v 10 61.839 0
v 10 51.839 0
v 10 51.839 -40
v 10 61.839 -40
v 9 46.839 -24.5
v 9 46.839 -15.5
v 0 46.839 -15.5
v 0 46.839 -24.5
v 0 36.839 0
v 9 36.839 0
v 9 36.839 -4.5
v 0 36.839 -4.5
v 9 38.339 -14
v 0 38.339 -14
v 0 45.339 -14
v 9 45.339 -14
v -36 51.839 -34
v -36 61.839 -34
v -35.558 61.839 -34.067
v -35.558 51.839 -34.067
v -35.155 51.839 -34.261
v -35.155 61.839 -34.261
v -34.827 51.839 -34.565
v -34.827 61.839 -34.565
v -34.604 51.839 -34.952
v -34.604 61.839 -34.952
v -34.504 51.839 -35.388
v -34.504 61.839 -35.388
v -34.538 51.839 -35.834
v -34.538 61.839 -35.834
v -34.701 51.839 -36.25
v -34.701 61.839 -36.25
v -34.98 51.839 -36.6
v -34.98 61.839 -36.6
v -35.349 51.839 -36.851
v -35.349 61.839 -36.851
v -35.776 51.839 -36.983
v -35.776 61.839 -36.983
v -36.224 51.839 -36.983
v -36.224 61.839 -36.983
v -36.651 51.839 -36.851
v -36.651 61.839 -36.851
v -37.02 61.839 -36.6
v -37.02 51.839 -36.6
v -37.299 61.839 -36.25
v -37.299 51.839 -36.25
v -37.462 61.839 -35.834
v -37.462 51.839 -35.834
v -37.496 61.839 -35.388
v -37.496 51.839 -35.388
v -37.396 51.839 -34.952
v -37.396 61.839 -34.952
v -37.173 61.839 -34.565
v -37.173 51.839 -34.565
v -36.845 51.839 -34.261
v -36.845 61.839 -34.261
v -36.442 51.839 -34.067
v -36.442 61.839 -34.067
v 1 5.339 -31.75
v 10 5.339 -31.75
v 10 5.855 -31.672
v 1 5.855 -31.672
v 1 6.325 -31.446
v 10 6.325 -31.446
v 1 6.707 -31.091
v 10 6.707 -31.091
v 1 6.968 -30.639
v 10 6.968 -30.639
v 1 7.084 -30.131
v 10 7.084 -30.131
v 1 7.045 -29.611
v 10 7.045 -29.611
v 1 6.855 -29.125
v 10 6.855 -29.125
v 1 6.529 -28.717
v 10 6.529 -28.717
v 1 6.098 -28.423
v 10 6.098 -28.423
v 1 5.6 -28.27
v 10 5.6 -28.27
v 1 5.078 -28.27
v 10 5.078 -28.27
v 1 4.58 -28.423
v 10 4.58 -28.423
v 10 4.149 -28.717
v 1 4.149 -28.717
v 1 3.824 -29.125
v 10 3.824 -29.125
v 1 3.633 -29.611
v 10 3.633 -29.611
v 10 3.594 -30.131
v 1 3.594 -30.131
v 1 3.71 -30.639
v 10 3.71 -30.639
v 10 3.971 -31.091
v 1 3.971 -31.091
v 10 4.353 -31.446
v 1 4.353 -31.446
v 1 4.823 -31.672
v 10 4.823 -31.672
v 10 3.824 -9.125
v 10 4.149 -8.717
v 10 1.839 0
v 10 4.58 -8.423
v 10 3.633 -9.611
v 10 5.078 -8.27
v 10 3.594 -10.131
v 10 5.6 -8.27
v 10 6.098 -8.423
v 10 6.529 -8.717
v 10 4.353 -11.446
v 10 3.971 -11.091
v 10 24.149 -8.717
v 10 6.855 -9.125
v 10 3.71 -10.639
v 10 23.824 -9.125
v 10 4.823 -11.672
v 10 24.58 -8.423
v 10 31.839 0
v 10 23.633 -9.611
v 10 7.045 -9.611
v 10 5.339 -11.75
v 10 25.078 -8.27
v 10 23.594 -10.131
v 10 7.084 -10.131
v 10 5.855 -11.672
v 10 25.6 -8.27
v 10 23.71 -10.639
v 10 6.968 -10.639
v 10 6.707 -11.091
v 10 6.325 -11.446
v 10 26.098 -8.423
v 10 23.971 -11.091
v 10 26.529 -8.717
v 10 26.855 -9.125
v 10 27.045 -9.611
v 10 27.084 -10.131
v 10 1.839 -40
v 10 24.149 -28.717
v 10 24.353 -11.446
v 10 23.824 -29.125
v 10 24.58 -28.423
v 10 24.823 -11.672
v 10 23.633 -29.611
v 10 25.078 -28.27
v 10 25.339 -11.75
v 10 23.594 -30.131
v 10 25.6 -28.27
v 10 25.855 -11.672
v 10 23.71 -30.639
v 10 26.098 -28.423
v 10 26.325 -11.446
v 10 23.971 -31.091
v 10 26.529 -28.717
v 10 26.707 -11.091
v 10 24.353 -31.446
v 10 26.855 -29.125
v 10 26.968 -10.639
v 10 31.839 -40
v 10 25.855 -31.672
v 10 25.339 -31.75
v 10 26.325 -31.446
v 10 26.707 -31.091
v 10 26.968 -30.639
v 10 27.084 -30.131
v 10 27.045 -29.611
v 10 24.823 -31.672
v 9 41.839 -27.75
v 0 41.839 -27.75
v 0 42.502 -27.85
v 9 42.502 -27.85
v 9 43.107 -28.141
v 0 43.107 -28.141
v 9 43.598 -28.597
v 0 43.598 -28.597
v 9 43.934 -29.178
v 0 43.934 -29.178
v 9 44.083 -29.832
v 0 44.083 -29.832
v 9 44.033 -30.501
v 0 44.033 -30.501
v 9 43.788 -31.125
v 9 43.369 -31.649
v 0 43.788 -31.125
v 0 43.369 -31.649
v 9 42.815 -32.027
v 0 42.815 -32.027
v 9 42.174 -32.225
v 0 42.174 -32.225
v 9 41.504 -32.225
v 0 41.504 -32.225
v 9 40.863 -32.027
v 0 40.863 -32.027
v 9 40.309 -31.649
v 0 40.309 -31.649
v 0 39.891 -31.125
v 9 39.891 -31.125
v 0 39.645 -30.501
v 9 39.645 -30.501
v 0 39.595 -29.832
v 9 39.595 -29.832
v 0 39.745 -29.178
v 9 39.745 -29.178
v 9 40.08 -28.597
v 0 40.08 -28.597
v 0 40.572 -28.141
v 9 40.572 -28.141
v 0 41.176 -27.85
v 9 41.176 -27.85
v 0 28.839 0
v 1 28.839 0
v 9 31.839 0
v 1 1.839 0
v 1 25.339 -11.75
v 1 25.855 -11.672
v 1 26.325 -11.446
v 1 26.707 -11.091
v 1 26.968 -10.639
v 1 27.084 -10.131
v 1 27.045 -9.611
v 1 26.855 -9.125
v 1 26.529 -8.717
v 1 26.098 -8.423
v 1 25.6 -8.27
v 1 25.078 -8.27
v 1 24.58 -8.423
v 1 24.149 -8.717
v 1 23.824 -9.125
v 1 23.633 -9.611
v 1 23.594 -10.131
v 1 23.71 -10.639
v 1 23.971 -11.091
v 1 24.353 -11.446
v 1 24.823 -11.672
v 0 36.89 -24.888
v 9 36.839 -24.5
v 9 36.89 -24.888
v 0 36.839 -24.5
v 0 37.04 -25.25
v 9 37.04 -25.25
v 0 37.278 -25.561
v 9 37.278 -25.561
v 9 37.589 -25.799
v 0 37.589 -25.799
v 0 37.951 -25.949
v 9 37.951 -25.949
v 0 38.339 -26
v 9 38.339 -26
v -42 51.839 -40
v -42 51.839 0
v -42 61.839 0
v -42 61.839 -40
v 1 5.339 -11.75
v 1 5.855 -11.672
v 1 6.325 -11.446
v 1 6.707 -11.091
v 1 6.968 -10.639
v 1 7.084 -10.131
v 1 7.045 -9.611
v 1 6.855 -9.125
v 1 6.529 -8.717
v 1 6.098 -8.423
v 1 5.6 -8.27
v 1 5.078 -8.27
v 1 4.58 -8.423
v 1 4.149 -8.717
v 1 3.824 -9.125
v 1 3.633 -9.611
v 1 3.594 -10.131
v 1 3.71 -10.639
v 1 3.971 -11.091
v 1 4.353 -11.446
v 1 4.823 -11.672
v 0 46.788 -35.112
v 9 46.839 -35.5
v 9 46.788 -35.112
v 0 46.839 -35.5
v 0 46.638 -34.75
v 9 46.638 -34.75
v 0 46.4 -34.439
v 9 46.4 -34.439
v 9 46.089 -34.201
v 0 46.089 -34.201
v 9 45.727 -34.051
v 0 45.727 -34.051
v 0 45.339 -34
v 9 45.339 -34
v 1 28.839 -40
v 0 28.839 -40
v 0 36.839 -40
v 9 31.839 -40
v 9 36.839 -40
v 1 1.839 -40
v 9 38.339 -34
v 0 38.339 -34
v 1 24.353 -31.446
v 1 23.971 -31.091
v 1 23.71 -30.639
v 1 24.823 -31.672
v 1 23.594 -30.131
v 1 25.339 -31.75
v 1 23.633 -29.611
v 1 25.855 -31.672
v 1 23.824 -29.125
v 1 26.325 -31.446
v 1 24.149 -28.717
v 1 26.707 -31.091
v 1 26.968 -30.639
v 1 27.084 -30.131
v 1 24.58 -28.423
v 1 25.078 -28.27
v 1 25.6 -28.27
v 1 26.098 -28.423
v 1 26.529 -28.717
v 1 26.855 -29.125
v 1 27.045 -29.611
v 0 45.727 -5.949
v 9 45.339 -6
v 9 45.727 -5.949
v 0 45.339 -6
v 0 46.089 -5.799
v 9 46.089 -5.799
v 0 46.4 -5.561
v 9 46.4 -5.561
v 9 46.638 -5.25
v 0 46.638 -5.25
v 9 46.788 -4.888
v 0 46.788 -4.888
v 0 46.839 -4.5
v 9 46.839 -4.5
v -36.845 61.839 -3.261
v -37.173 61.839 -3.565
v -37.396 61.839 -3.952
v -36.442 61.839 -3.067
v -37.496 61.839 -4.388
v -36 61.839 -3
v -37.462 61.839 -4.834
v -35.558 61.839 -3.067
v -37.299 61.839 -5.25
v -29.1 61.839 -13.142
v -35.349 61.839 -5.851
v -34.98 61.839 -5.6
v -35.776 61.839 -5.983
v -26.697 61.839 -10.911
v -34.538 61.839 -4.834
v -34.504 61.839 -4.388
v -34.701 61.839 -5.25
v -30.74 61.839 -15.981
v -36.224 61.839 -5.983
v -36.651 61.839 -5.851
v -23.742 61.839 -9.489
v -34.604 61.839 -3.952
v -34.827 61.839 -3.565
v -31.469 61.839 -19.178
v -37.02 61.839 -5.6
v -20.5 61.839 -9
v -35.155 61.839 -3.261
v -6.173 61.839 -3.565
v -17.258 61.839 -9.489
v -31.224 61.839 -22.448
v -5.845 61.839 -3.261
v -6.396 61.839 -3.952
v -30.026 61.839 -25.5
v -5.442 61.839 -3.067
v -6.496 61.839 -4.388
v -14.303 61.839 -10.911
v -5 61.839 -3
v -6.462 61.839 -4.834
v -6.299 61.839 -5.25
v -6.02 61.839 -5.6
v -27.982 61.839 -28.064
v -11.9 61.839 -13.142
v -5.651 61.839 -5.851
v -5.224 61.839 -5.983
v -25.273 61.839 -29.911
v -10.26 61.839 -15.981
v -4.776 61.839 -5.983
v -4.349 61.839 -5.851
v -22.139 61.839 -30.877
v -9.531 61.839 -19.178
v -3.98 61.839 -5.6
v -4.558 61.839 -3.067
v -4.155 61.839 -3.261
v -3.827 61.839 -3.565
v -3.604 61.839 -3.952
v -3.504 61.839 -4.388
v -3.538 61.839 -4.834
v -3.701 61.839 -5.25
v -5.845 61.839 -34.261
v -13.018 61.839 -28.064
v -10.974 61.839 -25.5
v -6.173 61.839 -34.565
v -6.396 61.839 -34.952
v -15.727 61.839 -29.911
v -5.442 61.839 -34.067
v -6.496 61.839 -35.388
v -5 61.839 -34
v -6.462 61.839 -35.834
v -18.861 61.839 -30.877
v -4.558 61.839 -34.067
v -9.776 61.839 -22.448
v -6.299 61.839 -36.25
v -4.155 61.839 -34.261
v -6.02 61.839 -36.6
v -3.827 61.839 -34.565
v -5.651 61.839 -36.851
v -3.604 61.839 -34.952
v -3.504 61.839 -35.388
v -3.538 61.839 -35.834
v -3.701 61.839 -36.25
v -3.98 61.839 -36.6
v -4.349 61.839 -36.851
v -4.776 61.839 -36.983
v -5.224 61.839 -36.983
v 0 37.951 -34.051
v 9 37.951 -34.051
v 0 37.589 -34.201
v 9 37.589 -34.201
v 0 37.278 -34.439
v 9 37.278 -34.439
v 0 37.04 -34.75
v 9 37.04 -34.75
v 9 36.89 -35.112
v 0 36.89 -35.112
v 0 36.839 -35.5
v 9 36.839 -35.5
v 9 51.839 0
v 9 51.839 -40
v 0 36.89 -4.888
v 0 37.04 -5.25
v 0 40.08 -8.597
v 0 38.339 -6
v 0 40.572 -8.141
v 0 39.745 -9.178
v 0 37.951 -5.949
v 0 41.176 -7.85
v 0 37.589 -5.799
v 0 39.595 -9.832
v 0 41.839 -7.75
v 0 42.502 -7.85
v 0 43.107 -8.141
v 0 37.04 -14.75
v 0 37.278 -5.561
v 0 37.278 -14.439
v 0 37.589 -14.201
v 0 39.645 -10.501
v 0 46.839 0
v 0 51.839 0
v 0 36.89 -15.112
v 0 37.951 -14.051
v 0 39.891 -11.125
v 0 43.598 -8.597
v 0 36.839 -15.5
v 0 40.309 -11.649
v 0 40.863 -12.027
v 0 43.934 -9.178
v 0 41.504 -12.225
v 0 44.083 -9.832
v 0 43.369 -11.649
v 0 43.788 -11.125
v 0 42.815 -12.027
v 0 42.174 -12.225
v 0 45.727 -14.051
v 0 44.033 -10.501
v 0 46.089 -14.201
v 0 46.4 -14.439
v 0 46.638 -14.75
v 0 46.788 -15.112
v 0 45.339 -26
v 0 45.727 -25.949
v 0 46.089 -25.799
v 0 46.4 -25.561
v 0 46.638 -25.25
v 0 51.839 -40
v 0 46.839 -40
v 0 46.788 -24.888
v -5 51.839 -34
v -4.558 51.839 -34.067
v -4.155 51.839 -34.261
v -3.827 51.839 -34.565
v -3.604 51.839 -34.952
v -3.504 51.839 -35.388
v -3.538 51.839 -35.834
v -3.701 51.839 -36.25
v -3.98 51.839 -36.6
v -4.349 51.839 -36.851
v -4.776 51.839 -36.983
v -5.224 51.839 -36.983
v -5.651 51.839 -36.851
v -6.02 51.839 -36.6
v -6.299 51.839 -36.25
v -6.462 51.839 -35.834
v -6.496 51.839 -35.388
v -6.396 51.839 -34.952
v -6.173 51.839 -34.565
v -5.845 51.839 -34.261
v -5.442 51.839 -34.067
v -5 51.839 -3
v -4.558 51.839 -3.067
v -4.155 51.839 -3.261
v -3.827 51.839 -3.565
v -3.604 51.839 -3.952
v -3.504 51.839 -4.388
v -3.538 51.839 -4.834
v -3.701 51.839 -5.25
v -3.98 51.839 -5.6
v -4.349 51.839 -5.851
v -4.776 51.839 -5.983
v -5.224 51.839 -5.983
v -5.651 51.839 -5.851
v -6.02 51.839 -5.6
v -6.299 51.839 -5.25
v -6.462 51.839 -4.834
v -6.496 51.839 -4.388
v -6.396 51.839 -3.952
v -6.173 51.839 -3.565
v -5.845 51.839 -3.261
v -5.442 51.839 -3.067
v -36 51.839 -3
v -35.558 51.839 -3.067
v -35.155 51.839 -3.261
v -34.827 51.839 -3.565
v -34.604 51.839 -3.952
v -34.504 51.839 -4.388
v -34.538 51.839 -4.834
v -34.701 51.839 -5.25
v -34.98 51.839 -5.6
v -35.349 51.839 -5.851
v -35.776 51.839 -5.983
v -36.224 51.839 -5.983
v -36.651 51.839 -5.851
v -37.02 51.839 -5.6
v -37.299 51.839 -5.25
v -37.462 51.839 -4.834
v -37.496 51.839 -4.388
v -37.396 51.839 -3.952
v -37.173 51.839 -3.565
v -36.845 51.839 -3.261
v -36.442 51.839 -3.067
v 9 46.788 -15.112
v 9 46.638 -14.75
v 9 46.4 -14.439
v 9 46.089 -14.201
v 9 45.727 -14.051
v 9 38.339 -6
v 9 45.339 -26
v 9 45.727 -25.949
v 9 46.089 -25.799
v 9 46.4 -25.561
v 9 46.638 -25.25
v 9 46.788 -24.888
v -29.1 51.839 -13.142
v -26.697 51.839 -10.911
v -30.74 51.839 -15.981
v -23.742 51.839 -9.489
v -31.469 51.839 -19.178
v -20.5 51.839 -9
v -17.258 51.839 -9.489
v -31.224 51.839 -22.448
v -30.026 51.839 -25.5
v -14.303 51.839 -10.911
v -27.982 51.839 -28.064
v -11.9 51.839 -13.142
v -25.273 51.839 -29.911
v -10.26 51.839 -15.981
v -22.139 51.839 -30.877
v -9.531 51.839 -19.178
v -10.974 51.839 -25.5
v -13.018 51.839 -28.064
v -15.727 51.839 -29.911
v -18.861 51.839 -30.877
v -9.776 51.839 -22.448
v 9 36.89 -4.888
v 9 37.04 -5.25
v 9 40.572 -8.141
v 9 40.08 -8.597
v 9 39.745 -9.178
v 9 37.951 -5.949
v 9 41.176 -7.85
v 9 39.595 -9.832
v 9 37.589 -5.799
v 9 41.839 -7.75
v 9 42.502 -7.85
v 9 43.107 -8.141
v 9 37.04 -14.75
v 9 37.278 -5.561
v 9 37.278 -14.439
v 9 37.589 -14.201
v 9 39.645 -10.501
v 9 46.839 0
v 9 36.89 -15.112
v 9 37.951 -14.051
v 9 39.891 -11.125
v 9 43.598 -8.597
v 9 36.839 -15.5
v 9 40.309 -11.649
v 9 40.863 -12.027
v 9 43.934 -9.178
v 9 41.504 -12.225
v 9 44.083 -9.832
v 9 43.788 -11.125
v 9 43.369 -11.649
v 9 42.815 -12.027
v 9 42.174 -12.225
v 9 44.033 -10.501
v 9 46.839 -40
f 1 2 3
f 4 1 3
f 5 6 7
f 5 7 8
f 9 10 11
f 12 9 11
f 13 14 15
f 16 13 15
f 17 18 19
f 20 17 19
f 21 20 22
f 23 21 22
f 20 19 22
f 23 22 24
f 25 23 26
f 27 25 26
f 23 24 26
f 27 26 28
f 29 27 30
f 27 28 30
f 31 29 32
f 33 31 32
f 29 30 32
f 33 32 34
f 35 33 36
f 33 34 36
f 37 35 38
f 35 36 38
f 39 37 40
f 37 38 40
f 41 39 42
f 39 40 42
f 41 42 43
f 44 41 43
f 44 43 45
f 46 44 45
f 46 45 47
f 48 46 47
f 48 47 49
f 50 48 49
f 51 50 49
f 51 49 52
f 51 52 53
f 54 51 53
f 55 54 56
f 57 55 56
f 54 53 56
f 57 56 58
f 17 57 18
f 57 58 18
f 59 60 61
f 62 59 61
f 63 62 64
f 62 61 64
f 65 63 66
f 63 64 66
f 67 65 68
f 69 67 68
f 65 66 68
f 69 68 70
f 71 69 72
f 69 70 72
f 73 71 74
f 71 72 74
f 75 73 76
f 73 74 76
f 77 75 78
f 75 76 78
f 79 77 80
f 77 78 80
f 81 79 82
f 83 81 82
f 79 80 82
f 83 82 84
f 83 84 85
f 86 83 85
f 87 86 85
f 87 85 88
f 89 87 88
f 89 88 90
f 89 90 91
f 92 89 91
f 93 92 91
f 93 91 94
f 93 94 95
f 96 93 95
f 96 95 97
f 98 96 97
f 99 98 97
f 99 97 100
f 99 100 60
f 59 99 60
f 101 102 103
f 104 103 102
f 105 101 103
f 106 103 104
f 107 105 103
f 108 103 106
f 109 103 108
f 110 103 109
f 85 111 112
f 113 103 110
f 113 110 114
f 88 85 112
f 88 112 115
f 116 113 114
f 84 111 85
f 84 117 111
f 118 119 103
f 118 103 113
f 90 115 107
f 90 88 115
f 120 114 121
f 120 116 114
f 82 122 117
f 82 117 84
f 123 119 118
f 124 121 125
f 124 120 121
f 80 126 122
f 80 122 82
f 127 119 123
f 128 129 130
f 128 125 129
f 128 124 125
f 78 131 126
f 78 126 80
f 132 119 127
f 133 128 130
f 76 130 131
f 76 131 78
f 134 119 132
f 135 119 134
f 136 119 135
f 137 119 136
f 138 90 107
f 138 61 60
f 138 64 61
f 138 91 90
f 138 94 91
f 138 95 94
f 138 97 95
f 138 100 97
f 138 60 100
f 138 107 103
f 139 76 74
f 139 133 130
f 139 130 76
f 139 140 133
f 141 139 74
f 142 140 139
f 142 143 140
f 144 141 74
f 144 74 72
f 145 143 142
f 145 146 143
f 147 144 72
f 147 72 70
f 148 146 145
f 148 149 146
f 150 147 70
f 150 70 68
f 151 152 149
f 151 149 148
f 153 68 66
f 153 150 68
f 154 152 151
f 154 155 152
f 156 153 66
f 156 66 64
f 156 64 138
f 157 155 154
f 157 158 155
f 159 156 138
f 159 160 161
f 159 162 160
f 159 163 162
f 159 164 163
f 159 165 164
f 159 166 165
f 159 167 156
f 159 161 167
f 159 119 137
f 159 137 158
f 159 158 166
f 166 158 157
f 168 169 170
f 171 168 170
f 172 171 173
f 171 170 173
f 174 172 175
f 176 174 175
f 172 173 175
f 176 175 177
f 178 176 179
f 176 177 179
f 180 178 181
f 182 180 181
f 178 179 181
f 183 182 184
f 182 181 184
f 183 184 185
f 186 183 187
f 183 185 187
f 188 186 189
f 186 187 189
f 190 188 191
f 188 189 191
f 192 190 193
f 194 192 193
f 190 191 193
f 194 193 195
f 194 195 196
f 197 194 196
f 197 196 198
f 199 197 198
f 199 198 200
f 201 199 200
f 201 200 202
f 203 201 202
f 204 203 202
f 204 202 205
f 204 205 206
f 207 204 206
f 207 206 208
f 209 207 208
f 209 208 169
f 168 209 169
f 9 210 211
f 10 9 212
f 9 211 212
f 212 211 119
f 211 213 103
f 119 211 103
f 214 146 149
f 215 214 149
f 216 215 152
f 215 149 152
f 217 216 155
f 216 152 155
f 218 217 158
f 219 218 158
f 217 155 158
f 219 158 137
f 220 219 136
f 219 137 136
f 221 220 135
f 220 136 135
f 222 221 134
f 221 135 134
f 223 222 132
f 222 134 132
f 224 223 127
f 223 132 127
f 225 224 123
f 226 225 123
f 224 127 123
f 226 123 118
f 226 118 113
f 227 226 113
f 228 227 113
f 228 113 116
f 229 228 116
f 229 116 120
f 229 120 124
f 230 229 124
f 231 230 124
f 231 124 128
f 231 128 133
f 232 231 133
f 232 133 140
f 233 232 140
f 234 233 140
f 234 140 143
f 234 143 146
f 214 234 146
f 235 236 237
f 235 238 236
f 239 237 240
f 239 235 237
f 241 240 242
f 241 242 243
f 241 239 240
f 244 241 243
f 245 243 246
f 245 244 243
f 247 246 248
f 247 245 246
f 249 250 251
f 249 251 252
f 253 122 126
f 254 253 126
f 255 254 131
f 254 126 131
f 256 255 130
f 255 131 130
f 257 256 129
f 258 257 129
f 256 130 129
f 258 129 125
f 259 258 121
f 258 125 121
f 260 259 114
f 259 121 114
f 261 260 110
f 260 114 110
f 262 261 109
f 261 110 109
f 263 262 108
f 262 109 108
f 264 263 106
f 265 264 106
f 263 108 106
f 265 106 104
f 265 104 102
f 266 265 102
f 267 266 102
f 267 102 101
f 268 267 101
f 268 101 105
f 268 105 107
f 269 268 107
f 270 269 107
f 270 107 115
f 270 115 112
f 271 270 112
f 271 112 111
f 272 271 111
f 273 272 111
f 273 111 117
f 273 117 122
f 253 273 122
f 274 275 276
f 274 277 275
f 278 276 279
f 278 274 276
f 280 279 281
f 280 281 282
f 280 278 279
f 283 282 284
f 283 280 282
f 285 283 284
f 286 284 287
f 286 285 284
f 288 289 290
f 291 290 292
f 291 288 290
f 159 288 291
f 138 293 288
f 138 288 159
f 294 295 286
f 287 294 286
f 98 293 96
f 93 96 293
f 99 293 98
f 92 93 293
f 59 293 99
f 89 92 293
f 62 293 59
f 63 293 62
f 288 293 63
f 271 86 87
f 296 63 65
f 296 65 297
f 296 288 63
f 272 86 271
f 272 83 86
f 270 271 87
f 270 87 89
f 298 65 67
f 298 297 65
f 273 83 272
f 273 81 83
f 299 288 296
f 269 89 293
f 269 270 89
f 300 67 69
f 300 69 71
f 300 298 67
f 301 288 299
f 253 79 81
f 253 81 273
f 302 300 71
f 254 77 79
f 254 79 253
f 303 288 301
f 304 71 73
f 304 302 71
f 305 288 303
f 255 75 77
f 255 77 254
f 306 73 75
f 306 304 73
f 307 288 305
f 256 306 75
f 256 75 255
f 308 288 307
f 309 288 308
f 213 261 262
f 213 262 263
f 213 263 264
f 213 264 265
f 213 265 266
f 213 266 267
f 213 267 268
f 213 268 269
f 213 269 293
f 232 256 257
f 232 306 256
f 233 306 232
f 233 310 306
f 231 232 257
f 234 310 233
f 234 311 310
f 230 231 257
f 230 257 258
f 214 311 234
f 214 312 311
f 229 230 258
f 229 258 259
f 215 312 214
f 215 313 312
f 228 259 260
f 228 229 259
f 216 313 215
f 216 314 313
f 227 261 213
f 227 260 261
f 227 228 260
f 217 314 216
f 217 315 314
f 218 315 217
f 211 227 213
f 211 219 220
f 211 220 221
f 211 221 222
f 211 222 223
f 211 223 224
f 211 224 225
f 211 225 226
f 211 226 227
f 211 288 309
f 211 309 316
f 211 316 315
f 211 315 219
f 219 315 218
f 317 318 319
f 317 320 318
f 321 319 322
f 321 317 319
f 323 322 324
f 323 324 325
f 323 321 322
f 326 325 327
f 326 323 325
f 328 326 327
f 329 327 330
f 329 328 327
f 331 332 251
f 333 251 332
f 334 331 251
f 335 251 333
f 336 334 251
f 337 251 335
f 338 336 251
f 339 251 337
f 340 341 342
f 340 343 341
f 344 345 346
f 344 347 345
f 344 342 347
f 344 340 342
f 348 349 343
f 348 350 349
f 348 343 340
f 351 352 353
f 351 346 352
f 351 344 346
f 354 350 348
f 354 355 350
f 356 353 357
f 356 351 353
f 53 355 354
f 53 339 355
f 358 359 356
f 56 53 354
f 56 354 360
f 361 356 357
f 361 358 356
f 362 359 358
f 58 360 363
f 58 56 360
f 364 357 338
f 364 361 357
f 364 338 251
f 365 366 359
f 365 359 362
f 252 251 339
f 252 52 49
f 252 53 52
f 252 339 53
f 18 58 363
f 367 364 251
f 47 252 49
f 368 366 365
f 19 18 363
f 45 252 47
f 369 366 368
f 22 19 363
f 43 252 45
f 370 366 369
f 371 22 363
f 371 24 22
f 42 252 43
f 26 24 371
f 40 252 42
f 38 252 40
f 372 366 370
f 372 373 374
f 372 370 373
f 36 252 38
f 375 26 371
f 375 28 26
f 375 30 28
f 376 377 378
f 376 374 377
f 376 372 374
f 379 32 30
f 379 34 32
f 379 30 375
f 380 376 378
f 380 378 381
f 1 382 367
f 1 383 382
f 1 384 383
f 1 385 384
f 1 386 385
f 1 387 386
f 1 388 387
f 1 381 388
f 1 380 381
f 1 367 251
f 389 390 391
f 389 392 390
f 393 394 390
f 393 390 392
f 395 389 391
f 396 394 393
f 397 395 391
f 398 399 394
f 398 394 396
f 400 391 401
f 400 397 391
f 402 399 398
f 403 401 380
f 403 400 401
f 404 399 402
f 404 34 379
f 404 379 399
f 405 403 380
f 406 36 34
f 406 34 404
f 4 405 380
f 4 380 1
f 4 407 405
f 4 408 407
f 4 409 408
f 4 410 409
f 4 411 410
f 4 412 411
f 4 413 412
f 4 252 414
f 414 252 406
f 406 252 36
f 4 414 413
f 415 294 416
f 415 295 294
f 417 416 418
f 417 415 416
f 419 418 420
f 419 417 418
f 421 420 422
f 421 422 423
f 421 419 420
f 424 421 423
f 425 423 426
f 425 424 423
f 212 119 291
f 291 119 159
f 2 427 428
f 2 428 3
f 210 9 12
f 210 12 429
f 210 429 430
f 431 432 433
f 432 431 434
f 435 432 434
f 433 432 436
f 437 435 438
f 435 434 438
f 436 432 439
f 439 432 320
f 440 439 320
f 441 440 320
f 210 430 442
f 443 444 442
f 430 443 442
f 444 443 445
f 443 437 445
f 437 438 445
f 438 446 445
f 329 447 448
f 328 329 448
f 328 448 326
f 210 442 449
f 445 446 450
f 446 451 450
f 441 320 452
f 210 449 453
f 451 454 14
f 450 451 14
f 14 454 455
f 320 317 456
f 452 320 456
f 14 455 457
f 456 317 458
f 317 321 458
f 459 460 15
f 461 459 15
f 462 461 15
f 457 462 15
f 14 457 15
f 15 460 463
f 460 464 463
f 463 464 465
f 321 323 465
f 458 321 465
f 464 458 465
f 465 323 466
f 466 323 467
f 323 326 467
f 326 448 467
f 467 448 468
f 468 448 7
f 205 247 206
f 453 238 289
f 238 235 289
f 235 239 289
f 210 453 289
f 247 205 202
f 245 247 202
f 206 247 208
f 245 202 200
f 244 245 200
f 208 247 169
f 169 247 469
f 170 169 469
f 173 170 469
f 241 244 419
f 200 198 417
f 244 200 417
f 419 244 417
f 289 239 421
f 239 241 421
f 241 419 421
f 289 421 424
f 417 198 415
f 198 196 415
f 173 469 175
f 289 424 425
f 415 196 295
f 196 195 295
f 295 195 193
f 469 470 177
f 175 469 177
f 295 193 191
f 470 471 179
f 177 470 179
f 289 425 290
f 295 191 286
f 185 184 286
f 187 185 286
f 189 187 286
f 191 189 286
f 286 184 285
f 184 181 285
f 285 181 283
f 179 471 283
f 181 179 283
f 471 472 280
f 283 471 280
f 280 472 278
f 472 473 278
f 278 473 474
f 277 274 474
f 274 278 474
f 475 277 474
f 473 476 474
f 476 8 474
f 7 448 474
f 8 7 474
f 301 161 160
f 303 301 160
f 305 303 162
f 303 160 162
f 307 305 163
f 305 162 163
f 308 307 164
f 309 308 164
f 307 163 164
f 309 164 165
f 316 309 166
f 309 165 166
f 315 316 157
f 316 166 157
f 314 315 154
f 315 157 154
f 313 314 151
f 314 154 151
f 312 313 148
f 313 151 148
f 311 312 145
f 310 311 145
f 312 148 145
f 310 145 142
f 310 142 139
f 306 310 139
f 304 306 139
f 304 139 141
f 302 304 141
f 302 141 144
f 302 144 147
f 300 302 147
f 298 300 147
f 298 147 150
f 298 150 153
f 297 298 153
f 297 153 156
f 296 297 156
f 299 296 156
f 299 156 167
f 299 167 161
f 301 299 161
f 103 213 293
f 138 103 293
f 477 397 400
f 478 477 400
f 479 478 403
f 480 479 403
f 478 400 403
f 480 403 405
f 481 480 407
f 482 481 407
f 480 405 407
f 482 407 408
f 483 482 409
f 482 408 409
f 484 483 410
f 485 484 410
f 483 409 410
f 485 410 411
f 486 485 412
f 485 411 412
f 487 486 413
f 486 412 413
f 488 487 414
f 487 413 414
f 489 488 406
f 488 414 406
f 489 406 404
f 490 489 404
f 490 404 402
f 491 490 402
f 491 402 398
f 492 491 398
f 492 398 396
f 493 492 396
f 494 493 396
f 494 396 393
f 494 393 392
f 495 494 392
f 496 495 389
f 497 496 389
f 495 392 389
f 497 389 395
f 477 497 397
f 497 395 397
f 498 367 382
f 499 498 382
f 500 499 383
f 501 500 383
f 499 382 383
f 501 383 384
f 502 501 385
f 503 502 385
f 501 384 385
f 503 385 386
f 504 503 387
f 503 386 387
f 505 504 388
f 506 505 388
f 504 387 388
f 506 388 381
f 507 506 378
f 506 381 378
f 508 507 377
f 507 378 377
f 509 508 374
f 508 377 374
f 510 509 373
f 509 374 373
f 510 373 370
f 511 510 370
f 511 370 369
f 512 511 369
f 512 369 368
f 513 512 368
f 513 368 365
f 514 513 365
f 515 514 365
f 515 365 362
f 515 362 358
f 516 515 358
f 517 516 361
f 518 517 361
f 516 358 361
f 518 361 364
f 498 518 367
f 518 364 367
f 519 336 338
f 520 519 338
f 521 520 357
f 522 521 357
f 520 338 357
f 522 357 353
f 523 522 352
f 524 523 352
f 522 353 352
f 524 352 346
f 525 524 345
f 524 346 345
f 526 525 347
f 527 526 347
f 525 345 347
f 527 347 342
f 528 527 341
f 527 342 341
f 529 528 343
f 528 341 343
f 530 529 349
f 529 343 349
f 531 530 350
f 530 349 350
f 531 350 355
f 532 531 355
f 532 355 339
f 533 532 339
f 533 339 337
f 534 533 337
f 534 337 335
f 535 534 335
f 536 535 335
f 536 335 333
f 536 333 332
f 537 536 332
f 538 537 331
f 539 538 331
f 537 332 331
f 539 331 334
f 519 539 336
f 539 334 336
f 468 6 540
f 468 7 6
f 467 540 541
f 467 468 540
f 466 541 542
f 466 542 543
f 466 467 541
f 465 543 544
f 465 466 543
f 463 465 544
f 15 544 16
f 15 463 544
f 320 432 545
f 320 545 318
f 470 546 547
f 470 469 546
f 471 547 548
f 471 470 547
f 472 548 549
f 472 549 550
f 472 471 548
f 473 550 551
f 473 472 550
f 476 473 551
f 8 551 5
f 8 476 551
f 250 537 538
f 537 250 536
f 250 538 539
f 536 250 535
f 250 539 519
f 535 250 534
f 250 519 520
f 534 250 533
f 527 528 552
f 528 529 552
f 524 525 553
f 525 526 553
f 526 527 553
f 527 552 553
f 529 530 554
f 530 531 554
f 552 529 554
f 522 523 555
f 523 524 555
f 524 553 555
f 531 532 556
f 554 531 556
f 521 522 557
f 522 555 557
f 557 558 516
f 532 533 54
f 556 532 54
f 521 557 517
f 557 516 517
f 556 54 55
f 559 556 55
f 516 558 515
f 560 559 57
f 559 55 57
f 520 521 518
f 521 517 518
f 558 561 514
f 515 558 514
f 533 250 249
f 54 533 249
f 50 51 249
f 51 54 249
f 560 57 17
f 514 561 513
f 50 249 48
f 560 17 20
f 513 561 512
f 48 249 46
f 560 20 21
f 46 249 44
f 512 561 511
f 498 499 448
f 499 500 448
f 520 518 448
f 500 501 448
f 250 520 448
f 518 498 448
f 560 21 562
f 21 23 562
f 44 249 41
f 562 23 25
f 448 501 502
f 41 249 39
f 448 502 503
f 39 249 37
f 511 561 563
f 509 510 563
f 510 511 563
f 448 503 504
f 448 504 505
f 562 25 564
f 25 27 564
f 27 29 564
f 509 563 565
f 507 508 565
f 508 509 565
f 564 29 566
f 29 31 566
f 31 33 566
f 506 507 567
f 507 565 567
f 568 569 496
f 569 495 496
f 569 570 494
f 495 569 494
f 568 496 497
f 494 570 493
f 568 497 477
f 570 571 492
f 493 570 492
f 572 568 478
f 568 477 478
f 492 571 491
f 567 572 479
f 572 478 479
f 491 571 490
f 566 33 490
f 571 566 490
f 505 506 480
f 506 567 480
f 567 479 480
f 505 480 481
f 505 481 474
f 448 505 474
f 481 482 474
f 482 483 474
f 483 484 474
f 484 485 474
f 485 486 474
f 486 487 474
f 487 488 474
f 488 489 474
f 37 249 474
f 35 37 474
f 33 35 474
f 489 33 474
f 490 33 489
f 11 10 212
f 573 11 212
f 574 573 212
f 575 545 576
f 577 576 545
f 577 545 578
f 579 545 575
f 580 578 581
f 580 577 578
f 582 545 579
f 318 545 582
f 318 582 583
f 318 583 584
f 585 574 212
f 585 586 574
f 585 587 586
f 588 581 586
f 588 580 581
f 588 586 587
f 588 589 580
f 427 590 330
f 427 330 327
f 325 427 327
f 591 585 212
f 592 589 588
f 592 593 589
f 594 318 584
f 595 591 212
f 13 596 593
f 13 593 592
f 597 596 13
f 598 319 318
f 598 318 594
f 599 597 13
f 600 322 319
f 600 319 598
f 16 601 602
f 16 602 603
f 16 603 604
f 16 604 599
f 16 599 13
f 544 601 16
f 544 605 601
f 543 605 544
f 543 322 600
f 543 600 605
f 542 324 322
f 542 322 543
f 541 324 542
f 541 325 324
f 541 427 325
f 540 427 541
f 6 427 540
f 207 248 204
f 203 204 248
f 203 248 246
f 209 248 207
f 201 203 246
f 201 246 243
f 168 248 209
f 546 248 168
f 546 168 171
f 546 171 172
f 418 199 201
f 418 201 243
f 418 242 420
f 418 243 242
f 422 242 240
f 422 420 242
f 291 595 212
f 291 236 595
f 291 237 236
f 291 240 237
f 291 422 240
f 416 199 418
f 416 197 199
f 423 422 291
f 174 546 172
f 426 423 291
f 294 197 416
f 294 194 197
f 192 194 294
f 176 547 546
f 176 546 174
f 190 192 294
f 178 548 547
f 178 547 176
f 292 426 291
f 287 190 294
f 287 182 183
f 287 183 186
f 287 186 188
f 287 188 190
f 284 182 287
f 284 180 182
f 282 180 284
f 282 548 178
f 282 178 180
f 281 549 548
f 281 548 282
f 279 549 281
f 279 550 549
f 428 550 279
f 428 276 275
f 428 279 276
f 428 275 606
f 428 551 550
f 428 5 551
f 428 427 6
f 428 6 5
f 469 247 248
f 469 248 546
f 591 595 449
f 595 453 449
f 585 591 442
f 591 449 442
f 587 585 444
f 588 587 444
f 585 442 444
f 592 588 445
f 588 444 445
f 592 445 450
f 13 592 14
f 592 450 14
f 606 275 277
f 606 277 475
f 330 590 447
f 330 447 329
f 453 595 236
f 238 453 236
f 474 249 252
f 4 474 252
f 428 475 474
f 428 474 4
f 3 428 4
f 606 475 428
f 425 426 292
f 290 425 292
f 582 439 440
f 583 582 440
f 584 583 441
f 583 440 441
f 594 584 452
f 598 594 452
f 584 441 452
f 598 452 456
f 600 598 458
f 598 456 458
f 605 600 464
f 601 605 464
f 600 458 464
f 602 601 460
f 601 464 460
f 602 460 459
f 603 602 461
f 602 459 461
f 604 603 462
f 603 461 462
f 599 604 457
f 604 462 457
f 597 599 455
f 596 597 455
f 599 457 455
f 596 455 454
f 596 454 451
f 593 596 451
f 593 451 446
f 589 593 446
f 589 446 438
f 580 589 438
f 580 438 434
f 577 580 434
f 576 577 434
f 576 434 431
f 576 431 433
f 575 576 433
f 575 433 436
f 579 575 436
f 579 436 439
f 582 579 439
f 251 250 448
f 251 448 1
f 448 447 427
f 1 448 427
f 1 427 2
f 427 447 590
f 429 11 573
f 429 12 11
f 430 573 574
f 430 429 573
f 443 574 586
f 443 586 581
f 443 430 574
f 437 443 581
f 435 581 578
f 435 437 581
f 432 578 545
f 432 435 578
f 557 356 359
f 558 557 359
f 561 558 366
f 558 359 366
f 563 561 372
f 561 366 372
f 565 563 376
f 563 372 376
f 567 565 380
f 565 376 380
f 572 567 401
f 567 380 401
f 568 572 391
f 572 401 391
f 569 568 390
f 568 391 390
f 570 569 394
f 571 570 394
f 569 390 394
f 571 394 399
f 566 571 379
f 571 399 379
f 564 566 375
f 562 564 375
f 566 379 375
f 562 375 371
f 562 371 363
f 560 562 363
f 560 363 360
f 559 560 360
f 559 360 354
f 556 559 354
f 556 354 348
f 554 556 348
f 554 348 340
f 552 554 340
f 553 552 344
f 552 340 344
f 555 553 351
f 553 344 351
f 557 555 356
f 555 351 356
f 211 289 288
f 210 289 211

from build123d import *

# Parameters (mm, degrees)
SKETCH1_W           = 40
SKETCH1_H           = 50
BOSS_EXTRUDE1_DEPTH = 10
SKETCH2_W           = 40
SKETCH2_H           = 27
CUT_EXTRUDE1_DEPTH  = 1
SKETCH3_R           = 1.75
CUT_EXTRUDE2_DEPTH  = 10
SKETCH4_W           = 40
SKETCH4_H           = 20
CUT_EXTRUDE3_DEPTH  = 1
SKETCH6_R           = 2.25
CUT_EXTRUDE4_DEPTH  = 10
SKETCH7_W           = 52
SKETCH7_H           = 40
BOSS_EXTRUDE2_DEPTH = 10
SKETCH8_R           = 11
CUT_EXTRUDE5_DEPTH  = 10
SKETCH9_W           = 6
SKETCH9_H           = 10
SKETCH9_W_2         = 12
CUT_EXTRUDE6_DEPTH  = 10
SKETCH10_R          = 1.5
CUT_EXTRUDE7_DEPTH  = 10
FILLET1_R           = 1.5
FILLET2_R           = 1.5


with BuildPart() as part:
    # Sketch1 → Boss-Extrude1 (new body)
    with BuildSketch(Plane(origin=(0, 0, 0), x_dir=(0, 0, -1), z_dir=(1, 0, 0))):
        with Locations((20, 26.83908046)):
            Rectangle(SKETCH1_W, SKETCH1_H)
    extrude(amount=BOSS_EXTRUDE1_DEPTH)

    # Sketch2 → Cut-Extrude1 (cut)
    with BuildSketch(Plane.ZY):
        with Locations((-20, 15.33908046)):
            Rectangle(SKETCH2_W, SKETCH2_H)
    extrude(amount=-CUT_EXTRUDE1_DEPTH, mode=Mode.SUBTRACT)

    # Sketch3 → Cut-Extrude2 (cut)
    with BuildSketch(Plane(origin=(10, 0, 0), x_dir=(0, 0, -1), z_dir=(1, 0, 0))):
        with Locations((10, 25.33908046)):
            Circle(SKETCH3_R)
        with Locations((30, 25.33908046)):
            Circle(SKETCH3_R)
        with Locations((30, 5.33908046)):
            Circle(SKETCH3_R)
        with Locations((10, 5.33908046)):
            Circle(SKETCH3_R)
    extrude(amount=-CUT_EXTRUDE2_DEPTH, mode=Mode.SUBTRACT)

    # Sketch4 → Cut-Extrude3 (cut)
    with BuildSketch(Plane(origin=(10, 0, 0), x_dir=(0, 0, -1), z_dir=(1, 0, 0))):
        with Locations((20, 41.83908046)):
            Rectangle(SKETCH4_W, SKETCH4_H)
    extrude(amount=-CUT_EXTRUDE3_DEPTH, mode=Mode.SUBTRACT)

    # Sketch6 → Cut-Extrude4 (cut)
    with BuildSketch(Plane.ZY):
        with Locations((-30, 41.83908046)):
            Circle(SKETCH6_R)
        with Locations((-10, 41.83908046)):
            Circle(SKETCH6_R)
    extrude(amount=-CUT_EXTRUDE4_DEPTH, mode=Mode.SUBTRACT)

    # Sketch7 → Boss-Extrude2 (add)
    with BuildSketch(Plane(origin=(0, 51.83908046, 0), x_dir=(1, 0, 0), z_dir=(0, 1, 0))):
        with Locations((-16, 20)):
            Rectangle(SKETCH7_W, SKETCH7_H)
    extrude(amount=BOSS_EXTRUDE2_DEPTH)

    # Sketch8 → Cut-Extrude5 (cut)
    with BuildSketch(Plane(origin=(0, 61.83908046, 0), x_dir=(1, 0, 0), z_dir=(0, 1, 0))):
        with Locations(Location((-20.5, 20, 0), (0, 0, 270))):
            Circle(SKETCH8_R)
    extrude(amount=-CUT_EXTRUDE5_DEPTH, mode=Mode.SUBTRACT)

    # Sketch9 → Cut-Extrude6 (cut)
    with BuildSketch(Plane(origin=(9, 0, 0), x_dir=(0, 0, -1), z_dir=(1, 0, 0))):
        with Locations((37, 41.83908046)):
            Rectangle(SKETCH9_W, SKETCH9_H)
        with Locations((20, 41.83908046)):
            Rectangle(SKETCH9_W_2, SKETCH9_H)
        with Locations((3, 41.83908046)):
            Rectangle(SKETCH9_W, SKETCH9_H)
    extrude(amount=-CUT_EXTRUDE6_DEPTH, mode=Mode.SUBTRACT)

    # Sketch10 → Cut-Extrude7 (cut)
    with BuildSketch(Plane(origin=(0, 61.83908046, 0), x_dir=(1, 0, 0), z_dir=(0, 1, 0))):
        with Locations(Location((-36, 35.5, 0), (0, 0, 270))):
            Circle(SKETCH10_R)
        with Locations(Location((-5, 35.5, 0), (0, 0, 270))):
            Circle(SKETCH10_R)
        with Locations(Location((-5, 4.5, 0), (0, 0, 270))):
            Circle(SKETCH10_R)
        with Locations(Location((-36, 4.5, 0), (0, 0, 270))):
            Circle(SKETCH10_R)
    extrude(amount=-CUT_EXTRUDE7_DEPTH, mode=Mode.SUBTRACT)

    # Fillet1
    fillet1_edges = [part.edges().sort_by_distance(p)[0] for p in [
        (4.5, 36.83908046, -14),
        (4.5, 46.83908046, -14),
        (4.5, 46.83908046, -26),
        (4.5, 36.83908046, -26),
    ]]
    fillet(fillet1_edges, radius=FILLET1_R)

    # Fillet2
    fillet2_edges = [part.edges().sort_by_distance(p)[0] for p in [
        (4.5, 36.83908046, -34),
        (4.5, 46.83908046, -34),
        (4.5, 46.83908046, -6),
        (4.5, 36.83908046, -6),
    ]]
    fillet(fillet2_edges, radius=FILLET2_R)


solid = part.part
